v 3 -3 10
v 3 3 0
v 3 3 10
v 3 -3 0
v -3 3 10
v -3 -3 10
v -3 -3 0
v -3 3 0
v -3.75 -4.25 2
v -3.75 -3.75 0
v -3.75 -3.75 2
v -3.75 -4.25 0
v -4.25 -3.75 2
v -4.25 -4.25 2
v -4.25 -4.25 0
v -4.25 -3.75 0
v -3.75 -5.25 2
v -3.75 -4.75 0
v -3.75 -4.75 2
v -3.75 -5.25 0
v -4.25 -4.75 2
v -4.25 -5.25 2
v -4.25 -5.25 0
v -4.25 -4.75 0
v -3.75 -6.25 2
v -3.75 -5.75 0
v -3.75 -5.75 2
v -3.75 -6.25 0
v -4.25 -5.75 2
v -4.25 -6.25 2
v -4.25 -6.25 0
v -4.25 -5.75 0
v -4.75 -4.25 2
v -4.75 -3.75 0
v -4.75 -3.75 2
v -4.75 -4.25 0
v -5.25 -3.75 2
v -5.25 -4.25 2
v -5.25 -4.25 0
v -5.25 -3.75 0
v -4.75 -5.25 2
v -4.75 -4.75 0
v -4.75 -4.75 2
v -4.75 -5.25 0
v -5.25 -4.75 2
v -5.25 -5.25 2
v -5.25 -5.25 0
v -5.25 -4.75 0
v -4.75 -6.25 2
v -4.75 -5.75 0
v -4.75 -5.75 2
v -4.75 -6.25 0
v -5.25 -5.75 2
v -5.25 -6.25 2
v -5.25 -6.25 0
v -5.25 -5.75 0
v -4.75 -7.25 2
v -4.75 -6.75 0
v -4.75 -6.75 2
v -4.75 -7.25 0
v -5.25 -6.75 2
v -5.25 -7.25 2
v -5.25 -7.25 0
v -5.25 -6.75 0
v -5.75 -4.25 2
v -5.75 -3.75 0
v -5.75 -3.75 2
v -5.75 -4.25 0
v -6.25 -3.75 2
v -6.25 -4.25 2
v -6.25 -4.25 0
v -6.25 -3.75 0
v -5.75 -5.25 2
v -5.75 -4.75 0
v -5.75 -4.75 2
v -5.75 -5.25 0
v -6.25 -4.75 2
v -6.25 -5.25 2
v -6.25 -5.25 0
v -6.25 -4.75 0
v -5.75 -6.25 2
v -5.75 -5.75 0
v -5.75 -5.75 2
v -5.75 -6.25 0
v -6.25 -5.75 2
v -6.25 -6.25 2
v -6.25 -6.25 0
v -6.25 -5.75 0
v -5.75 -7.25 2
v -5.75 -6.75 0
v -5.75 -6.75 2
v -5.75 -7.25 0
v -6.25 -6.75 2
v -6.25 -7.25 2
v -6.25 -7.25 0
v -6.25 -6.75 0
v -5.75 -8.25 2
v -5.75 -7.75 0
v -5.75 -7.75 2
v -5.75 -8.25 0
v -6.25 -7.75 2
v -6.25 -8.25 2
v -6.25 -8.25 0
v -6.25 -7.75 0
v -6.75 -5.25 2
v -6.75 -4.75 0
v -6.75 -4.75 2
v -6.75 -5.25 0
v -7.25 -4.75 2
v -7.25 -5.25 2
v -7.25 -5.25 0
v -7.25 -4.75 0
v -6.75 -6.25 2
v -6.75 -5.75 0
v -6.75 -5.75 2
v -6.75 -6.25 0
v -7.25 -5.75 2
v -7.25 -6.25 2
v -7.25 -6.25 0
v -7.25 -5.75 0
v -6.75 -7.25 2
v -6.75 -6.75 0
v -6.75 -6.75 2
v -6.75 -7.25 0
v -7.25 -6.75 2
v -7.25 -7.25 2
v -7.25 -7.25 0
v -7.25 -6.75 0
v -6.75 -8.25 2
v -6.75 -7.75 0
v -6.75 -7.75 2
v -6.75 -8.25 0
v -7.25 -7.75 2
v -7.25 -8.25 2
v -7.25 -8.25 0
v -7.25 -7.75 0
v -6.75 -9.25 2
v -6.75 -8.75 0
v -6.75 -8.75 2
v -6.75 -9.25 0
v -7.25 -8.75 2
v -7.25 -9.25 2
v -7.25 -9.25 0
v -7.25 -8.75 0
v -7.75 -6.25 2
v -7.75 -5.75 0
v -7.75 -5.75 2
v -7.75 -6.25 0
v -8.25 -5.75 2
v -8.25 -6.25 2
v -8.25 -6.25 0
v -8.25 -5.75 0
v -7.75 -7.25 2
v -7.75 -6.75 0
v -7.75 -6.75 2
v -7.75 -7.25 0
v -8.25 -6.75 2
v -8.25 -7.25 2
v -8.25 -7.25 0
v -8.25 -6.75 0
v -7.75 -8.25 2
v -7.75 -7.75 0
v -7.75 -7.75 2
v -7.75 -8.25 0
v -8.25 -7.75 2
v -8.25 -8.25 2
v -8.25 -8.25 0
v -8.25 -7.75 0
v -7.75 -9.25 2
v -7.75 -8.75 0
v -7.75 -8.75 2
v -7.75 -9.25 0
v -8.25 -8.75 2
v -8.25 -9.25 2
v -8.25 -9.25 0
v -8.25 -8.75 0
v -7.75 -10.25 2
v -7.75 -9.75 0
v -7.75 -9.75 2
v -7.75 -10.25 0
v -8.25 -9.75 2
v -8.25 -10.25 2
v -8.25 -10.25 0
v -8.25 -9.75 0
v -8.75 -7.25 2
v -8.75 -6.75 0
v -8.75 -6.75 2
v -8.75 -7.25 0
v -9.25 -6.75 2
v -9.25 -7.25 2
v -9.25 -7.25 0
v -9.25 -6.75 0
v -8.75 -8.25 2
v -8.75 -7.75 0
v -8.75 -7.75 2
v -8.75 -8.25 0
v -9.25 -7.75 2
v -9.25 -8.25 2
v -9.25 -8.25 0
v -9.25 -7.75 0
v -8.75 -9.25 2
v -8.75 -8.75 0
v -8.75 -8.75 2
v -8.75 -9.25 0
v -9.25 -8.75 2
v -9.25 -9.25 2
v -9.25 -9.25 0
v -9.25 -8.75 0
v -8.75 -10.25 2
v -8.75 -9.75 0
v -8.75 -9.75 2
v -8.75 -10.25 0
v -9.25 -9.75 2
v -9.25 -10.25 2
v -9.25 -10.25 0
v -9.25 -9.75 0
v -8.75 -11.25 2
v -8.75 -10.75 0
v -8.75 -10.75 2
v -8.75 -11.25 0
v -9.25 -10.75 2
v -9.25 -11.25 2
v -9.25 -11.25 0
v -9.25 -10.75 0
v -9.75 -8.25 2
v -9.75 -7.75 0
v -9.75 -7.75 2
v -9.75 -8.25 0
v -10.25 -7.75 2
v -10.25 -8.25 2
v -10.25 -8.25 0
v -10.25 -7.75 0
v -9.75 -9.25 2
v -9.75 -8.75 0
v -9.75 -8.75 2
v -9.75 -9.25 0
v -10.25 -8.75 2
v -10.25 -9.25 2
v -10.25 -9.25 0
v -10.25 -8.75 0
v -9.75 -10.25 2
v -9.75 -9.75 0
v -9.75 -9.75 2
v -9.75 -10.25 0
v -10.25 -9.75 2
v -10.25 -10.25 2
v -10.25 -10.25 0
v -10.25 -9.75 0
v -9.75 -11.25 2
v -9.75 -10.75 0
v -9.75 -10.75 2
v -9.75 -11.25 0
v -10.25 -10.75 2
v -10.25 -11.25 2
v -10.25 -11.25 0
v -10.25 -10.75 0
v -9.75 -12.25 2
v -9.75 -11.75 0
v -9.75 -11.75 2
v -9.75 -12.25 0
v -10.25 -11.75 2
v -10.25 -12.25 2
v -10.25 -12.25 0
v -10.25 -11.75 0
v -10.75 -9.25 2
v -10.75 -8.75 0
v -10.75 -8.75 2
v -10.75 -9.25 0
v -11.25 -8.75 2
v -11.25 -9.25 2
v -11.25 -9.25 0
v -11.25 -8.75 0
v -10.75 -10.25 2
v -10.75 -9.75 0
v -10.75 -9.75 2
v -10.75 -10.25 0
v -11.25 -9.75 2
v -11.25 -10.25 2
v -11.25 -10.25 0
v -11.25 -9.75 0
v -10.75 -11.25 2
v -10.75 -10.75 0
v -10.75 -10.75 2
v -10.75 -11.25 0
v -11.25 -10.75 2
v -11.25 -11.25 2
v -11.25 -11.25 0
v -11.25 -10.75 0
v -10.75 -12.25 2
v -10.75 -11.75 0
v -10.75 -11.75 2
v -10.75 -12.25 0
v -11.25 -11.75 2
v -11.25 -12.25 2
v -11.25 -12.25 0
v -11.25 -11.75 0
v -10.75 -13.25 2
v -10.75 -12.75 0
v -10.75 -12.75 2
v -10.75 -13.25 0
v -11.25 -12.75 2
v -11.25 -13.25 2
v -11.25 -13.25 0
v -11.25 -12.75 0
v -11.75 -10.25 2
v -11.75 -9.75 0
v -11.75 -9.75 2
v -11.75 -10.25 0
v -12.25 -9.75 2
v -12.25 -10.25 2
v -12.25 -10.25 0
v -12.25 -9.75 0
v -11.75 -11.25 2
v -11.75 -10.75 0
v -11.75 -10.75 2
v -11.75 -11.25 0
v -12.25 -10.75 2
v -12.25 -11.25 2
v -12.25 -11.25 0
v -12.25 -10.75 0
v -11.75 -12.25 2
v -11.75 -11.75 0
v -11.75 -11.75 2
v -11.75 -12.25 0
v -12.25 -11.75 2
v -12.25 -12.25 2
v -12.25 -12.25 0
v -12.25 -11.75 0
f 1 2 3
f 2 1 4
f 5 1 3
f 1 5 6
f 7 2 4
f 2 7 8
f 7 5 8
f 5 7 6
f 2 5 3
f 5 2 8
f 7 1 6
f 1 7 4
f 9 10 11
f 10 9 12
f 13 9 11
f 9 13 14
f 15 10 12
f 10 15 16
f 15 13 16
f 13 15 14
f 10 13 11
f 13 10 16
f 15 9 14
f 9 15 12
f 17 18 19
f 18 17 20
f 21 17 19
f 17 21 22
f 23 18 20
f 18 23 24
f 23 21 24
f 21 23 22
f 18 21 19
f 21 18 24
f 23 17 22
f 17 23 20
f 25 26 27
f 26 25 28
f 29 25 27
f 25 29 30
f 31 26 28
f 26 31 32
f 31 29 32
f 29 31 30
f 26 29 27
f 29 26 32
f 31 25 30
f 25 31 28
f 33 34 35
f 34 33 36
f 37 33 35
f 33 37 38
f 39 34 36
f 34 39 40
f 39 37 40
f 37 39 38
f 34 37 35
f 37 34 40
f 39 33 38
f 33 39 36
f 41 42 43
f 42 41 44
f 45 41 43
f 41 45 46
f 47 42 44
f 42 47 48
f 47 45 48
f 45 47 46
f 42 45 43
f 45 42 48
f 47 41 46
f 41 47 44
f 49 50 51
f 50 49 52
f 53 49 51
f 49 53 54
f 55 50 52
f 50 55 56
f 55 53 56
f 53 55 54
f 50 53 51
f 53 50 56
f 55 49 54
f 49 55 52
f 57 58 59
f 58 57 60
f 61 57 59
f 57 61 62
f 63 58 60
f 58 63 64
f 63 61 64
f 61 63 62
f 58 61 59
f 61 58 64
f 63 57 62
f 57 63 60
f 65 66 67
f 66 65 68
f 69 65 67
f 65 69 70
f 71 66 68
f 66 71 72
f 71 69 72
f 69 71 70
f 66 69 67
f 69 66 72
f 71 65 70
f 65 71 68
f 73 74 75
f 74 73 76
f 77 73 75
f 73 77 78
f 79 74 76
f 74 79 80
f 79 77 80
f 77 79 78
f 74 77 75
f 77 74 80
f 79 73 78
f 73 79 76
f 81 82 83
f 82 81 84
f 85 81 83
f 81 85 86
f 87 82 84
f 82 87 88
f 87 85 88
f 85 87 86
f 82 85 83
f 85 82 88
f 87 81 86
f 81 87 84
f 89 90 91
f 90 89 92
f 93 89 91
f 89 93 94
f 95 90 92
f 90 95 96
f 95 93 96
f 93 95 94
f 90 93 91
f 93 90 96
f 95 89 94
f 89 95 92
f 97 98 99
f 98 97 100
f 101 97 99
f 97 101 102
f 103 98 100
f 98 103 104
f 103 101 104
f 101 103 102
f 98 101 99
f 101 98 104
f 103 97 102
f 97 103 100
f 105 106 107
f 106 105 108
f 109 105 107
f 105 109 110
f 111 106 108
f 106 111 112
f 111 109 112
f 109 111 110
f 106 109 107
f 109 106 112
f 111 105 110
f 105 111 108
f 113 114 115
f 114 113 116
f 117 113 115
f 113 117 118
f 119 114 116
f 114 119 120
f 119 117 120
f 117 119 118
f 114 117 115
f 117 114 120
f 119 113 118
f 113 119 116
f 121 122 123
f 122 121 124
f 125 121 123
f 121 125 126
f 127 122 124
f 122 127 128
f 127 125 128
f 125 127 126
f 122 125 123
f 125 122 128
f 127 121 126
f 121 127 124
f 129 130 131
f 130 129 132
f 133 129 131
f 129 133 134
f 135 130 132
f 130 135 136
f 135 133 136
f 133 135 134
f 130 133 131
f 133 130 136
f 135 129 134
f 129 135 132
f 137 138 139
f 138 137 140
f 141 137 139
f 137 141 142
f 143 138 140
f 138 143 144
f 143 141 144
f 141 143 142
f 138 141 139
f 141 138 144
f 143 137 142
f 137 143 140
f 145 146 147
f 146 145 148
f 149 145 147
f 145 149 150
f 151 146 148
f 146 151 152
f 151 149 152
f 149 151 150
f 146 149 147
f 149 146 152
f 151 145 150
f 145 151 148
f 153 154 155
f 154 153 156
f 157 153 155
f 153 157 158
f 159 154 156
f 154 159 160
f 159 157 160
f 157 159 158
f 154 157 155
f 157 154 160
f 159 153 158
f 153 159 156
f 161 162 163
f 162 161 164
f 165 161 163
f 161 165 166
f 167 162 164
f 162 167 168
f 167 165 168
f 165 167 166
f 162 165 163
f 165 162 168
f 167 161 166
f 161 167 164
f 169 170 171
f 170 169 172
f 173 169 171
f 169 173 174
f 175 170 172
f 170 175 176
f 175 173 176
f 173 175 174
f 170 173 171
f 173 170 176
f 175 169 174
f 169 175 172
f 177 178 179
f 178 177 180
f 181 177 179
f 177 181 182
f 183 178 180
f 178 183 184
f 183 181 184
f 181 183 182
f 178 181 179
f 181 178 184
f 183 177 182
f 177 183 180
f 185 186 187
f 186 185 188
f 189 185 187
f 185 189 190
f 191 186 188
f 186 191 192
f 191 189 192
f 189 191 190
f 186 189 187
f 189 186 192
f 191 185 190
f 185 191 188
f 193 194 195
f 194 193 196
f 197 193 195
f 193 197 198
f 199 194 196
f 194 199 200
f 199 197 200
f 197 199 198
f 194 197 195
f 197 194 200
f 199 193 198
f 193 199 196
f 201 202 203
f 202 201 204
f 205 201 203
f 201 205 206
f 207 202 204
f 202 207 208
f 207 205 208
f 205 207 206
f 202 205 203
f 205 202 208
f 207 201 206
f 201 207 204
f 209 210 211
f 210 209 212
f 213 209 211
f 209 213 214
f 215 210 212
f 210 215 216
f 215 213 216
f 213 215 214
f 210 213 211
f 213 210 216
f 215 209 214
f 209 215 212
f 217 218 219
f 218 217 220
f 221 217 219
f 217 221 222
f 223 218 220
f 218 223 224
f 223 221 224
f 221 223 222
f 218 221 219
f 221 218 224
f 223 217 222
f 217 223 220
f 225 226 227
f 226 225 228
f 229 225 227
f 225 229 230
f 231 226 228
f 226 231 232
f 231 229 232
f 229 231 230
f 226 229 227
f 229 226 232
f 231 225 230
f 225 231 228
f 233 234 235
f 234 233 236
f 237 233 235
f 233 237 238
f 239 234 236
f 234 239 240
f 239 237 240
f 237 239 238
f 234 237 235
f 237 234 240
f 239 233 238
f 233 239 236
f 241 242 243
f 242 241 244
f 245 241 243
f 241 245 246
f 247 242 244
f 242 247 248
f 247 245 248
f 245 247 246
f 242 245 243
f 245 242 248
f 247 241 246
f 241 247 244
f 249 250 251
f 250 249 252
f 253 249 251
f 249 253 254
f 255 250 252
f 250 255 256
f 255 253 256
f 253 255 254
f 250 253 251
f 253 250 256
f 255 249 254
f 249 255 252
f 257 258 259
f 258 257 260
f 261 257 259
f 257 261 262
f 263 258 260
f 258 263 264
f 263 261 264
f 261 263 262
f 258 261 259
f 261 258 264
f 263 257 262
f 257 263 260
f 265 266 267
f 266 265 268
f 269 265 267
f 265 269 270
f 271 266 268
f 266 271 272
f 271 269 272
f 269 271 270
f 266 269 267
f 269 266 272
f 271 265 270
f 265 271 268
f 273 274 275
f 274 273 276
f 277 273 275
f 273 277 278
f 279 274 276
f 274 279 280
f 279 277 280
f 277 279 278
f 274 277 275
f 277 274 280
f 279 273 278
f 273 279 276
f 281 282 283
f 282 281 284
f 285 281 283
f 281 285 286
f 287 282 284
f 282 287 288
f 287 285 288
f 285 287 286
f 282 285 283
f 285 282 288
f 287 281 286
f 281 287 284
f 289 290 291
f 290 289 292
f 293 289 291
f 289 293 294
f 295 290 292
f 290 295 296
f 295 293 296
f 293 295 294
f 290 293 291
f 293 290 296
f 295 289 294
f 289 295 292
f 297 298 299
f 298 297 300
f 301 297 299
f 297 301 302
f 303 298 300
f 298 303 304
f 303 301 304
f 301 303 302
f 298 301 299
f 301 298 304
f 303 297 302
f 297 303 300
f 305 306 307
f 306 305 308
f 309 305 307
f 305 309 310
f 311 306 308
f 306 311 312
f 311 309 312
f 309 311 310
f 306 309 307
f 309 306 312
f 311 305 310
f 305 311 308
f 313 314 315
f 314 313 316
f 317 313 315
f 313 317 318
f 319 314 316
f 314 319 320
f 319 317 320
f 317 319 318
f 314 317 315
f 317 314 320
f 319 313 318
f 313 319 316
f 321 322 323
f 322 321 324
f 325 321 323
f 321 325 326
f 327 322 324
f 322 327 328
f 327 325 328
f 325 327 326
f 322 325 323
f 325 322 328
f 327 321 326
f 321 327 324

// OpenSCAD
translate([0, 0, 5]) color([0,1,0,0.9]) cube([6, 6, 10], center=true);
translate([-4, -4, 1]) color([1,0,0]) cube([0.5, 0.5, 2], center=true);
translate([-4, -5, 1]) color([1,0,0]) cube([0.5, 0.5, 2], center=true);
translate([-4, -6, 1]) color([1,0,0]) cube([0.5, 0.5, 2], center=true);
translate([-5, -4, 1]) color([1,0,0]) cube([0.5, 0.5, 2], center=true);
translate([-5, -5, 1]) color([1,0,0]) cube([0.5, 0.5, 2], center=true);
translate([-5, -6, 1]) color([1,0,0]) cube([0.5, 0.5, 2], center=true);
translate([-5, -7, 1]) color([1,0,0]) cube([0.5, 0.5, 2], center=true);
translate([-6, -4, 1]) color([1,0,0]) cube([0.5, 0.5, 2], center=true);
translate([-6, -5, 1]) color([1,0,0]) cube([0.5, 0.5, 2], center=true);
translate([-6, -6, 1]) color([1,0,0]) cube([0.5, 0.5, 2], center=true);
translate([-6, -7, 1]) color([1,0,0]) cube([0.5, 0.5, 2], center=true);
translate([-6, -8, 1]) color([1,0,0]) cube([0.5, 0.5, 2], center=true);
translate([-7, -5, 1]) color([1,0,0]) cube([0.5, 0.5, 2], center=true);
translate([-7, -6, 1]) color([1,0,0]) cube([0.5, 0.5, 2], center=true);
translate([-7, -7, 1]) color([1,0,0]) cube([0.5, 0.5, 2], center=true);
translate([-7, -8, 1]) color([1,0,0]) cube([0.5, 0.5, 2], center=true);
translate([-7, -9, 1]) color([1,0,0]) cube([0.5, 0.5, 2], center=true);
translate([-8, -6, 1]) color([1,0,0]) cube([0.5, 0.5, 2], center=true);
translate([-8, -7, 1]) color([1,0,0]) cube([0.5, 0.5, 2], center=true);
translate([-8, -8, 1]) color([1,0,0]) cube([0.5, 0.5, 2], center=true);
translate([-8, -9, 1]) color([1,0,0]) cube([0.5, 0.5, 2], center=true);
translate([-8, -10, 1]) color([1,0,0]) cube([0.5, 0.5, 2], center=true);
translate([-9, -7, 1]) color([1,0,0]) cube([0.5, 0.5, 2], center=true);
translate([-9, -8, 1]) color([1,0,0]) cube([0.5, 0.5, 2], center=true);
translate([-9, -9, 1]) color([1,0,0]) cube([0.5, 0.5, 2], center=true);
translate([-9, -10, 1]) color([1,0,0]) cube([0.5, 0.5, 2], center=true);
translate([-9, -11, 1]) color([1,0,0]) cube([0.5, 0.5, 2], center=true);
translate([-10, -8, 1]) color([1,0,0]) cube([0.5, 0.5, 2], center=true);
translate([-10, -9, 1]) color([1,0,0]) cube([0.5, 0.5, 2], center=true);
translate([-10, -10, 1]) color([1,0,0]) cube([0.5, 0.5, 2], center=true);
translate([-10, -11, 1]) color([1,0,0]) cube([0.5, 0.5, 2], center=true);
translate([-10, -12, 1]) color([1,0,0]) cube([0.5, 0.5, 2], center=true);
translate([-11, -9, 1]) color([1,0,0]) cube([0.5, 0.5, 2], center=true);
translate([-11, -10, 1]) color([1,0,0]) cube([0.5, 0.5, 2], center=true);
translate([-11, -11, 1]) color([1,0,0]) cube([0.5, 0.5, 2], center=true);
translate([-11, -12, 1]) color([1,0,0]) cube([0.5, 0.5, 2], center=true);
translate([-11, -13, 1]) color([1,0,0]) cube([0.5, 0.5, 2], center=true);
translate([-12, -10, 1]) color([1,0,0]) cube([0.5, 0.5, 2], center=true);
translate([-12, -11, 1]) color([1,0,0]) cube([0.5, 0.5, 2], center=true);
translate([-12, -12, 1]) color([1,0,0]) cube([0.5, 0.5, 2], center=true);
